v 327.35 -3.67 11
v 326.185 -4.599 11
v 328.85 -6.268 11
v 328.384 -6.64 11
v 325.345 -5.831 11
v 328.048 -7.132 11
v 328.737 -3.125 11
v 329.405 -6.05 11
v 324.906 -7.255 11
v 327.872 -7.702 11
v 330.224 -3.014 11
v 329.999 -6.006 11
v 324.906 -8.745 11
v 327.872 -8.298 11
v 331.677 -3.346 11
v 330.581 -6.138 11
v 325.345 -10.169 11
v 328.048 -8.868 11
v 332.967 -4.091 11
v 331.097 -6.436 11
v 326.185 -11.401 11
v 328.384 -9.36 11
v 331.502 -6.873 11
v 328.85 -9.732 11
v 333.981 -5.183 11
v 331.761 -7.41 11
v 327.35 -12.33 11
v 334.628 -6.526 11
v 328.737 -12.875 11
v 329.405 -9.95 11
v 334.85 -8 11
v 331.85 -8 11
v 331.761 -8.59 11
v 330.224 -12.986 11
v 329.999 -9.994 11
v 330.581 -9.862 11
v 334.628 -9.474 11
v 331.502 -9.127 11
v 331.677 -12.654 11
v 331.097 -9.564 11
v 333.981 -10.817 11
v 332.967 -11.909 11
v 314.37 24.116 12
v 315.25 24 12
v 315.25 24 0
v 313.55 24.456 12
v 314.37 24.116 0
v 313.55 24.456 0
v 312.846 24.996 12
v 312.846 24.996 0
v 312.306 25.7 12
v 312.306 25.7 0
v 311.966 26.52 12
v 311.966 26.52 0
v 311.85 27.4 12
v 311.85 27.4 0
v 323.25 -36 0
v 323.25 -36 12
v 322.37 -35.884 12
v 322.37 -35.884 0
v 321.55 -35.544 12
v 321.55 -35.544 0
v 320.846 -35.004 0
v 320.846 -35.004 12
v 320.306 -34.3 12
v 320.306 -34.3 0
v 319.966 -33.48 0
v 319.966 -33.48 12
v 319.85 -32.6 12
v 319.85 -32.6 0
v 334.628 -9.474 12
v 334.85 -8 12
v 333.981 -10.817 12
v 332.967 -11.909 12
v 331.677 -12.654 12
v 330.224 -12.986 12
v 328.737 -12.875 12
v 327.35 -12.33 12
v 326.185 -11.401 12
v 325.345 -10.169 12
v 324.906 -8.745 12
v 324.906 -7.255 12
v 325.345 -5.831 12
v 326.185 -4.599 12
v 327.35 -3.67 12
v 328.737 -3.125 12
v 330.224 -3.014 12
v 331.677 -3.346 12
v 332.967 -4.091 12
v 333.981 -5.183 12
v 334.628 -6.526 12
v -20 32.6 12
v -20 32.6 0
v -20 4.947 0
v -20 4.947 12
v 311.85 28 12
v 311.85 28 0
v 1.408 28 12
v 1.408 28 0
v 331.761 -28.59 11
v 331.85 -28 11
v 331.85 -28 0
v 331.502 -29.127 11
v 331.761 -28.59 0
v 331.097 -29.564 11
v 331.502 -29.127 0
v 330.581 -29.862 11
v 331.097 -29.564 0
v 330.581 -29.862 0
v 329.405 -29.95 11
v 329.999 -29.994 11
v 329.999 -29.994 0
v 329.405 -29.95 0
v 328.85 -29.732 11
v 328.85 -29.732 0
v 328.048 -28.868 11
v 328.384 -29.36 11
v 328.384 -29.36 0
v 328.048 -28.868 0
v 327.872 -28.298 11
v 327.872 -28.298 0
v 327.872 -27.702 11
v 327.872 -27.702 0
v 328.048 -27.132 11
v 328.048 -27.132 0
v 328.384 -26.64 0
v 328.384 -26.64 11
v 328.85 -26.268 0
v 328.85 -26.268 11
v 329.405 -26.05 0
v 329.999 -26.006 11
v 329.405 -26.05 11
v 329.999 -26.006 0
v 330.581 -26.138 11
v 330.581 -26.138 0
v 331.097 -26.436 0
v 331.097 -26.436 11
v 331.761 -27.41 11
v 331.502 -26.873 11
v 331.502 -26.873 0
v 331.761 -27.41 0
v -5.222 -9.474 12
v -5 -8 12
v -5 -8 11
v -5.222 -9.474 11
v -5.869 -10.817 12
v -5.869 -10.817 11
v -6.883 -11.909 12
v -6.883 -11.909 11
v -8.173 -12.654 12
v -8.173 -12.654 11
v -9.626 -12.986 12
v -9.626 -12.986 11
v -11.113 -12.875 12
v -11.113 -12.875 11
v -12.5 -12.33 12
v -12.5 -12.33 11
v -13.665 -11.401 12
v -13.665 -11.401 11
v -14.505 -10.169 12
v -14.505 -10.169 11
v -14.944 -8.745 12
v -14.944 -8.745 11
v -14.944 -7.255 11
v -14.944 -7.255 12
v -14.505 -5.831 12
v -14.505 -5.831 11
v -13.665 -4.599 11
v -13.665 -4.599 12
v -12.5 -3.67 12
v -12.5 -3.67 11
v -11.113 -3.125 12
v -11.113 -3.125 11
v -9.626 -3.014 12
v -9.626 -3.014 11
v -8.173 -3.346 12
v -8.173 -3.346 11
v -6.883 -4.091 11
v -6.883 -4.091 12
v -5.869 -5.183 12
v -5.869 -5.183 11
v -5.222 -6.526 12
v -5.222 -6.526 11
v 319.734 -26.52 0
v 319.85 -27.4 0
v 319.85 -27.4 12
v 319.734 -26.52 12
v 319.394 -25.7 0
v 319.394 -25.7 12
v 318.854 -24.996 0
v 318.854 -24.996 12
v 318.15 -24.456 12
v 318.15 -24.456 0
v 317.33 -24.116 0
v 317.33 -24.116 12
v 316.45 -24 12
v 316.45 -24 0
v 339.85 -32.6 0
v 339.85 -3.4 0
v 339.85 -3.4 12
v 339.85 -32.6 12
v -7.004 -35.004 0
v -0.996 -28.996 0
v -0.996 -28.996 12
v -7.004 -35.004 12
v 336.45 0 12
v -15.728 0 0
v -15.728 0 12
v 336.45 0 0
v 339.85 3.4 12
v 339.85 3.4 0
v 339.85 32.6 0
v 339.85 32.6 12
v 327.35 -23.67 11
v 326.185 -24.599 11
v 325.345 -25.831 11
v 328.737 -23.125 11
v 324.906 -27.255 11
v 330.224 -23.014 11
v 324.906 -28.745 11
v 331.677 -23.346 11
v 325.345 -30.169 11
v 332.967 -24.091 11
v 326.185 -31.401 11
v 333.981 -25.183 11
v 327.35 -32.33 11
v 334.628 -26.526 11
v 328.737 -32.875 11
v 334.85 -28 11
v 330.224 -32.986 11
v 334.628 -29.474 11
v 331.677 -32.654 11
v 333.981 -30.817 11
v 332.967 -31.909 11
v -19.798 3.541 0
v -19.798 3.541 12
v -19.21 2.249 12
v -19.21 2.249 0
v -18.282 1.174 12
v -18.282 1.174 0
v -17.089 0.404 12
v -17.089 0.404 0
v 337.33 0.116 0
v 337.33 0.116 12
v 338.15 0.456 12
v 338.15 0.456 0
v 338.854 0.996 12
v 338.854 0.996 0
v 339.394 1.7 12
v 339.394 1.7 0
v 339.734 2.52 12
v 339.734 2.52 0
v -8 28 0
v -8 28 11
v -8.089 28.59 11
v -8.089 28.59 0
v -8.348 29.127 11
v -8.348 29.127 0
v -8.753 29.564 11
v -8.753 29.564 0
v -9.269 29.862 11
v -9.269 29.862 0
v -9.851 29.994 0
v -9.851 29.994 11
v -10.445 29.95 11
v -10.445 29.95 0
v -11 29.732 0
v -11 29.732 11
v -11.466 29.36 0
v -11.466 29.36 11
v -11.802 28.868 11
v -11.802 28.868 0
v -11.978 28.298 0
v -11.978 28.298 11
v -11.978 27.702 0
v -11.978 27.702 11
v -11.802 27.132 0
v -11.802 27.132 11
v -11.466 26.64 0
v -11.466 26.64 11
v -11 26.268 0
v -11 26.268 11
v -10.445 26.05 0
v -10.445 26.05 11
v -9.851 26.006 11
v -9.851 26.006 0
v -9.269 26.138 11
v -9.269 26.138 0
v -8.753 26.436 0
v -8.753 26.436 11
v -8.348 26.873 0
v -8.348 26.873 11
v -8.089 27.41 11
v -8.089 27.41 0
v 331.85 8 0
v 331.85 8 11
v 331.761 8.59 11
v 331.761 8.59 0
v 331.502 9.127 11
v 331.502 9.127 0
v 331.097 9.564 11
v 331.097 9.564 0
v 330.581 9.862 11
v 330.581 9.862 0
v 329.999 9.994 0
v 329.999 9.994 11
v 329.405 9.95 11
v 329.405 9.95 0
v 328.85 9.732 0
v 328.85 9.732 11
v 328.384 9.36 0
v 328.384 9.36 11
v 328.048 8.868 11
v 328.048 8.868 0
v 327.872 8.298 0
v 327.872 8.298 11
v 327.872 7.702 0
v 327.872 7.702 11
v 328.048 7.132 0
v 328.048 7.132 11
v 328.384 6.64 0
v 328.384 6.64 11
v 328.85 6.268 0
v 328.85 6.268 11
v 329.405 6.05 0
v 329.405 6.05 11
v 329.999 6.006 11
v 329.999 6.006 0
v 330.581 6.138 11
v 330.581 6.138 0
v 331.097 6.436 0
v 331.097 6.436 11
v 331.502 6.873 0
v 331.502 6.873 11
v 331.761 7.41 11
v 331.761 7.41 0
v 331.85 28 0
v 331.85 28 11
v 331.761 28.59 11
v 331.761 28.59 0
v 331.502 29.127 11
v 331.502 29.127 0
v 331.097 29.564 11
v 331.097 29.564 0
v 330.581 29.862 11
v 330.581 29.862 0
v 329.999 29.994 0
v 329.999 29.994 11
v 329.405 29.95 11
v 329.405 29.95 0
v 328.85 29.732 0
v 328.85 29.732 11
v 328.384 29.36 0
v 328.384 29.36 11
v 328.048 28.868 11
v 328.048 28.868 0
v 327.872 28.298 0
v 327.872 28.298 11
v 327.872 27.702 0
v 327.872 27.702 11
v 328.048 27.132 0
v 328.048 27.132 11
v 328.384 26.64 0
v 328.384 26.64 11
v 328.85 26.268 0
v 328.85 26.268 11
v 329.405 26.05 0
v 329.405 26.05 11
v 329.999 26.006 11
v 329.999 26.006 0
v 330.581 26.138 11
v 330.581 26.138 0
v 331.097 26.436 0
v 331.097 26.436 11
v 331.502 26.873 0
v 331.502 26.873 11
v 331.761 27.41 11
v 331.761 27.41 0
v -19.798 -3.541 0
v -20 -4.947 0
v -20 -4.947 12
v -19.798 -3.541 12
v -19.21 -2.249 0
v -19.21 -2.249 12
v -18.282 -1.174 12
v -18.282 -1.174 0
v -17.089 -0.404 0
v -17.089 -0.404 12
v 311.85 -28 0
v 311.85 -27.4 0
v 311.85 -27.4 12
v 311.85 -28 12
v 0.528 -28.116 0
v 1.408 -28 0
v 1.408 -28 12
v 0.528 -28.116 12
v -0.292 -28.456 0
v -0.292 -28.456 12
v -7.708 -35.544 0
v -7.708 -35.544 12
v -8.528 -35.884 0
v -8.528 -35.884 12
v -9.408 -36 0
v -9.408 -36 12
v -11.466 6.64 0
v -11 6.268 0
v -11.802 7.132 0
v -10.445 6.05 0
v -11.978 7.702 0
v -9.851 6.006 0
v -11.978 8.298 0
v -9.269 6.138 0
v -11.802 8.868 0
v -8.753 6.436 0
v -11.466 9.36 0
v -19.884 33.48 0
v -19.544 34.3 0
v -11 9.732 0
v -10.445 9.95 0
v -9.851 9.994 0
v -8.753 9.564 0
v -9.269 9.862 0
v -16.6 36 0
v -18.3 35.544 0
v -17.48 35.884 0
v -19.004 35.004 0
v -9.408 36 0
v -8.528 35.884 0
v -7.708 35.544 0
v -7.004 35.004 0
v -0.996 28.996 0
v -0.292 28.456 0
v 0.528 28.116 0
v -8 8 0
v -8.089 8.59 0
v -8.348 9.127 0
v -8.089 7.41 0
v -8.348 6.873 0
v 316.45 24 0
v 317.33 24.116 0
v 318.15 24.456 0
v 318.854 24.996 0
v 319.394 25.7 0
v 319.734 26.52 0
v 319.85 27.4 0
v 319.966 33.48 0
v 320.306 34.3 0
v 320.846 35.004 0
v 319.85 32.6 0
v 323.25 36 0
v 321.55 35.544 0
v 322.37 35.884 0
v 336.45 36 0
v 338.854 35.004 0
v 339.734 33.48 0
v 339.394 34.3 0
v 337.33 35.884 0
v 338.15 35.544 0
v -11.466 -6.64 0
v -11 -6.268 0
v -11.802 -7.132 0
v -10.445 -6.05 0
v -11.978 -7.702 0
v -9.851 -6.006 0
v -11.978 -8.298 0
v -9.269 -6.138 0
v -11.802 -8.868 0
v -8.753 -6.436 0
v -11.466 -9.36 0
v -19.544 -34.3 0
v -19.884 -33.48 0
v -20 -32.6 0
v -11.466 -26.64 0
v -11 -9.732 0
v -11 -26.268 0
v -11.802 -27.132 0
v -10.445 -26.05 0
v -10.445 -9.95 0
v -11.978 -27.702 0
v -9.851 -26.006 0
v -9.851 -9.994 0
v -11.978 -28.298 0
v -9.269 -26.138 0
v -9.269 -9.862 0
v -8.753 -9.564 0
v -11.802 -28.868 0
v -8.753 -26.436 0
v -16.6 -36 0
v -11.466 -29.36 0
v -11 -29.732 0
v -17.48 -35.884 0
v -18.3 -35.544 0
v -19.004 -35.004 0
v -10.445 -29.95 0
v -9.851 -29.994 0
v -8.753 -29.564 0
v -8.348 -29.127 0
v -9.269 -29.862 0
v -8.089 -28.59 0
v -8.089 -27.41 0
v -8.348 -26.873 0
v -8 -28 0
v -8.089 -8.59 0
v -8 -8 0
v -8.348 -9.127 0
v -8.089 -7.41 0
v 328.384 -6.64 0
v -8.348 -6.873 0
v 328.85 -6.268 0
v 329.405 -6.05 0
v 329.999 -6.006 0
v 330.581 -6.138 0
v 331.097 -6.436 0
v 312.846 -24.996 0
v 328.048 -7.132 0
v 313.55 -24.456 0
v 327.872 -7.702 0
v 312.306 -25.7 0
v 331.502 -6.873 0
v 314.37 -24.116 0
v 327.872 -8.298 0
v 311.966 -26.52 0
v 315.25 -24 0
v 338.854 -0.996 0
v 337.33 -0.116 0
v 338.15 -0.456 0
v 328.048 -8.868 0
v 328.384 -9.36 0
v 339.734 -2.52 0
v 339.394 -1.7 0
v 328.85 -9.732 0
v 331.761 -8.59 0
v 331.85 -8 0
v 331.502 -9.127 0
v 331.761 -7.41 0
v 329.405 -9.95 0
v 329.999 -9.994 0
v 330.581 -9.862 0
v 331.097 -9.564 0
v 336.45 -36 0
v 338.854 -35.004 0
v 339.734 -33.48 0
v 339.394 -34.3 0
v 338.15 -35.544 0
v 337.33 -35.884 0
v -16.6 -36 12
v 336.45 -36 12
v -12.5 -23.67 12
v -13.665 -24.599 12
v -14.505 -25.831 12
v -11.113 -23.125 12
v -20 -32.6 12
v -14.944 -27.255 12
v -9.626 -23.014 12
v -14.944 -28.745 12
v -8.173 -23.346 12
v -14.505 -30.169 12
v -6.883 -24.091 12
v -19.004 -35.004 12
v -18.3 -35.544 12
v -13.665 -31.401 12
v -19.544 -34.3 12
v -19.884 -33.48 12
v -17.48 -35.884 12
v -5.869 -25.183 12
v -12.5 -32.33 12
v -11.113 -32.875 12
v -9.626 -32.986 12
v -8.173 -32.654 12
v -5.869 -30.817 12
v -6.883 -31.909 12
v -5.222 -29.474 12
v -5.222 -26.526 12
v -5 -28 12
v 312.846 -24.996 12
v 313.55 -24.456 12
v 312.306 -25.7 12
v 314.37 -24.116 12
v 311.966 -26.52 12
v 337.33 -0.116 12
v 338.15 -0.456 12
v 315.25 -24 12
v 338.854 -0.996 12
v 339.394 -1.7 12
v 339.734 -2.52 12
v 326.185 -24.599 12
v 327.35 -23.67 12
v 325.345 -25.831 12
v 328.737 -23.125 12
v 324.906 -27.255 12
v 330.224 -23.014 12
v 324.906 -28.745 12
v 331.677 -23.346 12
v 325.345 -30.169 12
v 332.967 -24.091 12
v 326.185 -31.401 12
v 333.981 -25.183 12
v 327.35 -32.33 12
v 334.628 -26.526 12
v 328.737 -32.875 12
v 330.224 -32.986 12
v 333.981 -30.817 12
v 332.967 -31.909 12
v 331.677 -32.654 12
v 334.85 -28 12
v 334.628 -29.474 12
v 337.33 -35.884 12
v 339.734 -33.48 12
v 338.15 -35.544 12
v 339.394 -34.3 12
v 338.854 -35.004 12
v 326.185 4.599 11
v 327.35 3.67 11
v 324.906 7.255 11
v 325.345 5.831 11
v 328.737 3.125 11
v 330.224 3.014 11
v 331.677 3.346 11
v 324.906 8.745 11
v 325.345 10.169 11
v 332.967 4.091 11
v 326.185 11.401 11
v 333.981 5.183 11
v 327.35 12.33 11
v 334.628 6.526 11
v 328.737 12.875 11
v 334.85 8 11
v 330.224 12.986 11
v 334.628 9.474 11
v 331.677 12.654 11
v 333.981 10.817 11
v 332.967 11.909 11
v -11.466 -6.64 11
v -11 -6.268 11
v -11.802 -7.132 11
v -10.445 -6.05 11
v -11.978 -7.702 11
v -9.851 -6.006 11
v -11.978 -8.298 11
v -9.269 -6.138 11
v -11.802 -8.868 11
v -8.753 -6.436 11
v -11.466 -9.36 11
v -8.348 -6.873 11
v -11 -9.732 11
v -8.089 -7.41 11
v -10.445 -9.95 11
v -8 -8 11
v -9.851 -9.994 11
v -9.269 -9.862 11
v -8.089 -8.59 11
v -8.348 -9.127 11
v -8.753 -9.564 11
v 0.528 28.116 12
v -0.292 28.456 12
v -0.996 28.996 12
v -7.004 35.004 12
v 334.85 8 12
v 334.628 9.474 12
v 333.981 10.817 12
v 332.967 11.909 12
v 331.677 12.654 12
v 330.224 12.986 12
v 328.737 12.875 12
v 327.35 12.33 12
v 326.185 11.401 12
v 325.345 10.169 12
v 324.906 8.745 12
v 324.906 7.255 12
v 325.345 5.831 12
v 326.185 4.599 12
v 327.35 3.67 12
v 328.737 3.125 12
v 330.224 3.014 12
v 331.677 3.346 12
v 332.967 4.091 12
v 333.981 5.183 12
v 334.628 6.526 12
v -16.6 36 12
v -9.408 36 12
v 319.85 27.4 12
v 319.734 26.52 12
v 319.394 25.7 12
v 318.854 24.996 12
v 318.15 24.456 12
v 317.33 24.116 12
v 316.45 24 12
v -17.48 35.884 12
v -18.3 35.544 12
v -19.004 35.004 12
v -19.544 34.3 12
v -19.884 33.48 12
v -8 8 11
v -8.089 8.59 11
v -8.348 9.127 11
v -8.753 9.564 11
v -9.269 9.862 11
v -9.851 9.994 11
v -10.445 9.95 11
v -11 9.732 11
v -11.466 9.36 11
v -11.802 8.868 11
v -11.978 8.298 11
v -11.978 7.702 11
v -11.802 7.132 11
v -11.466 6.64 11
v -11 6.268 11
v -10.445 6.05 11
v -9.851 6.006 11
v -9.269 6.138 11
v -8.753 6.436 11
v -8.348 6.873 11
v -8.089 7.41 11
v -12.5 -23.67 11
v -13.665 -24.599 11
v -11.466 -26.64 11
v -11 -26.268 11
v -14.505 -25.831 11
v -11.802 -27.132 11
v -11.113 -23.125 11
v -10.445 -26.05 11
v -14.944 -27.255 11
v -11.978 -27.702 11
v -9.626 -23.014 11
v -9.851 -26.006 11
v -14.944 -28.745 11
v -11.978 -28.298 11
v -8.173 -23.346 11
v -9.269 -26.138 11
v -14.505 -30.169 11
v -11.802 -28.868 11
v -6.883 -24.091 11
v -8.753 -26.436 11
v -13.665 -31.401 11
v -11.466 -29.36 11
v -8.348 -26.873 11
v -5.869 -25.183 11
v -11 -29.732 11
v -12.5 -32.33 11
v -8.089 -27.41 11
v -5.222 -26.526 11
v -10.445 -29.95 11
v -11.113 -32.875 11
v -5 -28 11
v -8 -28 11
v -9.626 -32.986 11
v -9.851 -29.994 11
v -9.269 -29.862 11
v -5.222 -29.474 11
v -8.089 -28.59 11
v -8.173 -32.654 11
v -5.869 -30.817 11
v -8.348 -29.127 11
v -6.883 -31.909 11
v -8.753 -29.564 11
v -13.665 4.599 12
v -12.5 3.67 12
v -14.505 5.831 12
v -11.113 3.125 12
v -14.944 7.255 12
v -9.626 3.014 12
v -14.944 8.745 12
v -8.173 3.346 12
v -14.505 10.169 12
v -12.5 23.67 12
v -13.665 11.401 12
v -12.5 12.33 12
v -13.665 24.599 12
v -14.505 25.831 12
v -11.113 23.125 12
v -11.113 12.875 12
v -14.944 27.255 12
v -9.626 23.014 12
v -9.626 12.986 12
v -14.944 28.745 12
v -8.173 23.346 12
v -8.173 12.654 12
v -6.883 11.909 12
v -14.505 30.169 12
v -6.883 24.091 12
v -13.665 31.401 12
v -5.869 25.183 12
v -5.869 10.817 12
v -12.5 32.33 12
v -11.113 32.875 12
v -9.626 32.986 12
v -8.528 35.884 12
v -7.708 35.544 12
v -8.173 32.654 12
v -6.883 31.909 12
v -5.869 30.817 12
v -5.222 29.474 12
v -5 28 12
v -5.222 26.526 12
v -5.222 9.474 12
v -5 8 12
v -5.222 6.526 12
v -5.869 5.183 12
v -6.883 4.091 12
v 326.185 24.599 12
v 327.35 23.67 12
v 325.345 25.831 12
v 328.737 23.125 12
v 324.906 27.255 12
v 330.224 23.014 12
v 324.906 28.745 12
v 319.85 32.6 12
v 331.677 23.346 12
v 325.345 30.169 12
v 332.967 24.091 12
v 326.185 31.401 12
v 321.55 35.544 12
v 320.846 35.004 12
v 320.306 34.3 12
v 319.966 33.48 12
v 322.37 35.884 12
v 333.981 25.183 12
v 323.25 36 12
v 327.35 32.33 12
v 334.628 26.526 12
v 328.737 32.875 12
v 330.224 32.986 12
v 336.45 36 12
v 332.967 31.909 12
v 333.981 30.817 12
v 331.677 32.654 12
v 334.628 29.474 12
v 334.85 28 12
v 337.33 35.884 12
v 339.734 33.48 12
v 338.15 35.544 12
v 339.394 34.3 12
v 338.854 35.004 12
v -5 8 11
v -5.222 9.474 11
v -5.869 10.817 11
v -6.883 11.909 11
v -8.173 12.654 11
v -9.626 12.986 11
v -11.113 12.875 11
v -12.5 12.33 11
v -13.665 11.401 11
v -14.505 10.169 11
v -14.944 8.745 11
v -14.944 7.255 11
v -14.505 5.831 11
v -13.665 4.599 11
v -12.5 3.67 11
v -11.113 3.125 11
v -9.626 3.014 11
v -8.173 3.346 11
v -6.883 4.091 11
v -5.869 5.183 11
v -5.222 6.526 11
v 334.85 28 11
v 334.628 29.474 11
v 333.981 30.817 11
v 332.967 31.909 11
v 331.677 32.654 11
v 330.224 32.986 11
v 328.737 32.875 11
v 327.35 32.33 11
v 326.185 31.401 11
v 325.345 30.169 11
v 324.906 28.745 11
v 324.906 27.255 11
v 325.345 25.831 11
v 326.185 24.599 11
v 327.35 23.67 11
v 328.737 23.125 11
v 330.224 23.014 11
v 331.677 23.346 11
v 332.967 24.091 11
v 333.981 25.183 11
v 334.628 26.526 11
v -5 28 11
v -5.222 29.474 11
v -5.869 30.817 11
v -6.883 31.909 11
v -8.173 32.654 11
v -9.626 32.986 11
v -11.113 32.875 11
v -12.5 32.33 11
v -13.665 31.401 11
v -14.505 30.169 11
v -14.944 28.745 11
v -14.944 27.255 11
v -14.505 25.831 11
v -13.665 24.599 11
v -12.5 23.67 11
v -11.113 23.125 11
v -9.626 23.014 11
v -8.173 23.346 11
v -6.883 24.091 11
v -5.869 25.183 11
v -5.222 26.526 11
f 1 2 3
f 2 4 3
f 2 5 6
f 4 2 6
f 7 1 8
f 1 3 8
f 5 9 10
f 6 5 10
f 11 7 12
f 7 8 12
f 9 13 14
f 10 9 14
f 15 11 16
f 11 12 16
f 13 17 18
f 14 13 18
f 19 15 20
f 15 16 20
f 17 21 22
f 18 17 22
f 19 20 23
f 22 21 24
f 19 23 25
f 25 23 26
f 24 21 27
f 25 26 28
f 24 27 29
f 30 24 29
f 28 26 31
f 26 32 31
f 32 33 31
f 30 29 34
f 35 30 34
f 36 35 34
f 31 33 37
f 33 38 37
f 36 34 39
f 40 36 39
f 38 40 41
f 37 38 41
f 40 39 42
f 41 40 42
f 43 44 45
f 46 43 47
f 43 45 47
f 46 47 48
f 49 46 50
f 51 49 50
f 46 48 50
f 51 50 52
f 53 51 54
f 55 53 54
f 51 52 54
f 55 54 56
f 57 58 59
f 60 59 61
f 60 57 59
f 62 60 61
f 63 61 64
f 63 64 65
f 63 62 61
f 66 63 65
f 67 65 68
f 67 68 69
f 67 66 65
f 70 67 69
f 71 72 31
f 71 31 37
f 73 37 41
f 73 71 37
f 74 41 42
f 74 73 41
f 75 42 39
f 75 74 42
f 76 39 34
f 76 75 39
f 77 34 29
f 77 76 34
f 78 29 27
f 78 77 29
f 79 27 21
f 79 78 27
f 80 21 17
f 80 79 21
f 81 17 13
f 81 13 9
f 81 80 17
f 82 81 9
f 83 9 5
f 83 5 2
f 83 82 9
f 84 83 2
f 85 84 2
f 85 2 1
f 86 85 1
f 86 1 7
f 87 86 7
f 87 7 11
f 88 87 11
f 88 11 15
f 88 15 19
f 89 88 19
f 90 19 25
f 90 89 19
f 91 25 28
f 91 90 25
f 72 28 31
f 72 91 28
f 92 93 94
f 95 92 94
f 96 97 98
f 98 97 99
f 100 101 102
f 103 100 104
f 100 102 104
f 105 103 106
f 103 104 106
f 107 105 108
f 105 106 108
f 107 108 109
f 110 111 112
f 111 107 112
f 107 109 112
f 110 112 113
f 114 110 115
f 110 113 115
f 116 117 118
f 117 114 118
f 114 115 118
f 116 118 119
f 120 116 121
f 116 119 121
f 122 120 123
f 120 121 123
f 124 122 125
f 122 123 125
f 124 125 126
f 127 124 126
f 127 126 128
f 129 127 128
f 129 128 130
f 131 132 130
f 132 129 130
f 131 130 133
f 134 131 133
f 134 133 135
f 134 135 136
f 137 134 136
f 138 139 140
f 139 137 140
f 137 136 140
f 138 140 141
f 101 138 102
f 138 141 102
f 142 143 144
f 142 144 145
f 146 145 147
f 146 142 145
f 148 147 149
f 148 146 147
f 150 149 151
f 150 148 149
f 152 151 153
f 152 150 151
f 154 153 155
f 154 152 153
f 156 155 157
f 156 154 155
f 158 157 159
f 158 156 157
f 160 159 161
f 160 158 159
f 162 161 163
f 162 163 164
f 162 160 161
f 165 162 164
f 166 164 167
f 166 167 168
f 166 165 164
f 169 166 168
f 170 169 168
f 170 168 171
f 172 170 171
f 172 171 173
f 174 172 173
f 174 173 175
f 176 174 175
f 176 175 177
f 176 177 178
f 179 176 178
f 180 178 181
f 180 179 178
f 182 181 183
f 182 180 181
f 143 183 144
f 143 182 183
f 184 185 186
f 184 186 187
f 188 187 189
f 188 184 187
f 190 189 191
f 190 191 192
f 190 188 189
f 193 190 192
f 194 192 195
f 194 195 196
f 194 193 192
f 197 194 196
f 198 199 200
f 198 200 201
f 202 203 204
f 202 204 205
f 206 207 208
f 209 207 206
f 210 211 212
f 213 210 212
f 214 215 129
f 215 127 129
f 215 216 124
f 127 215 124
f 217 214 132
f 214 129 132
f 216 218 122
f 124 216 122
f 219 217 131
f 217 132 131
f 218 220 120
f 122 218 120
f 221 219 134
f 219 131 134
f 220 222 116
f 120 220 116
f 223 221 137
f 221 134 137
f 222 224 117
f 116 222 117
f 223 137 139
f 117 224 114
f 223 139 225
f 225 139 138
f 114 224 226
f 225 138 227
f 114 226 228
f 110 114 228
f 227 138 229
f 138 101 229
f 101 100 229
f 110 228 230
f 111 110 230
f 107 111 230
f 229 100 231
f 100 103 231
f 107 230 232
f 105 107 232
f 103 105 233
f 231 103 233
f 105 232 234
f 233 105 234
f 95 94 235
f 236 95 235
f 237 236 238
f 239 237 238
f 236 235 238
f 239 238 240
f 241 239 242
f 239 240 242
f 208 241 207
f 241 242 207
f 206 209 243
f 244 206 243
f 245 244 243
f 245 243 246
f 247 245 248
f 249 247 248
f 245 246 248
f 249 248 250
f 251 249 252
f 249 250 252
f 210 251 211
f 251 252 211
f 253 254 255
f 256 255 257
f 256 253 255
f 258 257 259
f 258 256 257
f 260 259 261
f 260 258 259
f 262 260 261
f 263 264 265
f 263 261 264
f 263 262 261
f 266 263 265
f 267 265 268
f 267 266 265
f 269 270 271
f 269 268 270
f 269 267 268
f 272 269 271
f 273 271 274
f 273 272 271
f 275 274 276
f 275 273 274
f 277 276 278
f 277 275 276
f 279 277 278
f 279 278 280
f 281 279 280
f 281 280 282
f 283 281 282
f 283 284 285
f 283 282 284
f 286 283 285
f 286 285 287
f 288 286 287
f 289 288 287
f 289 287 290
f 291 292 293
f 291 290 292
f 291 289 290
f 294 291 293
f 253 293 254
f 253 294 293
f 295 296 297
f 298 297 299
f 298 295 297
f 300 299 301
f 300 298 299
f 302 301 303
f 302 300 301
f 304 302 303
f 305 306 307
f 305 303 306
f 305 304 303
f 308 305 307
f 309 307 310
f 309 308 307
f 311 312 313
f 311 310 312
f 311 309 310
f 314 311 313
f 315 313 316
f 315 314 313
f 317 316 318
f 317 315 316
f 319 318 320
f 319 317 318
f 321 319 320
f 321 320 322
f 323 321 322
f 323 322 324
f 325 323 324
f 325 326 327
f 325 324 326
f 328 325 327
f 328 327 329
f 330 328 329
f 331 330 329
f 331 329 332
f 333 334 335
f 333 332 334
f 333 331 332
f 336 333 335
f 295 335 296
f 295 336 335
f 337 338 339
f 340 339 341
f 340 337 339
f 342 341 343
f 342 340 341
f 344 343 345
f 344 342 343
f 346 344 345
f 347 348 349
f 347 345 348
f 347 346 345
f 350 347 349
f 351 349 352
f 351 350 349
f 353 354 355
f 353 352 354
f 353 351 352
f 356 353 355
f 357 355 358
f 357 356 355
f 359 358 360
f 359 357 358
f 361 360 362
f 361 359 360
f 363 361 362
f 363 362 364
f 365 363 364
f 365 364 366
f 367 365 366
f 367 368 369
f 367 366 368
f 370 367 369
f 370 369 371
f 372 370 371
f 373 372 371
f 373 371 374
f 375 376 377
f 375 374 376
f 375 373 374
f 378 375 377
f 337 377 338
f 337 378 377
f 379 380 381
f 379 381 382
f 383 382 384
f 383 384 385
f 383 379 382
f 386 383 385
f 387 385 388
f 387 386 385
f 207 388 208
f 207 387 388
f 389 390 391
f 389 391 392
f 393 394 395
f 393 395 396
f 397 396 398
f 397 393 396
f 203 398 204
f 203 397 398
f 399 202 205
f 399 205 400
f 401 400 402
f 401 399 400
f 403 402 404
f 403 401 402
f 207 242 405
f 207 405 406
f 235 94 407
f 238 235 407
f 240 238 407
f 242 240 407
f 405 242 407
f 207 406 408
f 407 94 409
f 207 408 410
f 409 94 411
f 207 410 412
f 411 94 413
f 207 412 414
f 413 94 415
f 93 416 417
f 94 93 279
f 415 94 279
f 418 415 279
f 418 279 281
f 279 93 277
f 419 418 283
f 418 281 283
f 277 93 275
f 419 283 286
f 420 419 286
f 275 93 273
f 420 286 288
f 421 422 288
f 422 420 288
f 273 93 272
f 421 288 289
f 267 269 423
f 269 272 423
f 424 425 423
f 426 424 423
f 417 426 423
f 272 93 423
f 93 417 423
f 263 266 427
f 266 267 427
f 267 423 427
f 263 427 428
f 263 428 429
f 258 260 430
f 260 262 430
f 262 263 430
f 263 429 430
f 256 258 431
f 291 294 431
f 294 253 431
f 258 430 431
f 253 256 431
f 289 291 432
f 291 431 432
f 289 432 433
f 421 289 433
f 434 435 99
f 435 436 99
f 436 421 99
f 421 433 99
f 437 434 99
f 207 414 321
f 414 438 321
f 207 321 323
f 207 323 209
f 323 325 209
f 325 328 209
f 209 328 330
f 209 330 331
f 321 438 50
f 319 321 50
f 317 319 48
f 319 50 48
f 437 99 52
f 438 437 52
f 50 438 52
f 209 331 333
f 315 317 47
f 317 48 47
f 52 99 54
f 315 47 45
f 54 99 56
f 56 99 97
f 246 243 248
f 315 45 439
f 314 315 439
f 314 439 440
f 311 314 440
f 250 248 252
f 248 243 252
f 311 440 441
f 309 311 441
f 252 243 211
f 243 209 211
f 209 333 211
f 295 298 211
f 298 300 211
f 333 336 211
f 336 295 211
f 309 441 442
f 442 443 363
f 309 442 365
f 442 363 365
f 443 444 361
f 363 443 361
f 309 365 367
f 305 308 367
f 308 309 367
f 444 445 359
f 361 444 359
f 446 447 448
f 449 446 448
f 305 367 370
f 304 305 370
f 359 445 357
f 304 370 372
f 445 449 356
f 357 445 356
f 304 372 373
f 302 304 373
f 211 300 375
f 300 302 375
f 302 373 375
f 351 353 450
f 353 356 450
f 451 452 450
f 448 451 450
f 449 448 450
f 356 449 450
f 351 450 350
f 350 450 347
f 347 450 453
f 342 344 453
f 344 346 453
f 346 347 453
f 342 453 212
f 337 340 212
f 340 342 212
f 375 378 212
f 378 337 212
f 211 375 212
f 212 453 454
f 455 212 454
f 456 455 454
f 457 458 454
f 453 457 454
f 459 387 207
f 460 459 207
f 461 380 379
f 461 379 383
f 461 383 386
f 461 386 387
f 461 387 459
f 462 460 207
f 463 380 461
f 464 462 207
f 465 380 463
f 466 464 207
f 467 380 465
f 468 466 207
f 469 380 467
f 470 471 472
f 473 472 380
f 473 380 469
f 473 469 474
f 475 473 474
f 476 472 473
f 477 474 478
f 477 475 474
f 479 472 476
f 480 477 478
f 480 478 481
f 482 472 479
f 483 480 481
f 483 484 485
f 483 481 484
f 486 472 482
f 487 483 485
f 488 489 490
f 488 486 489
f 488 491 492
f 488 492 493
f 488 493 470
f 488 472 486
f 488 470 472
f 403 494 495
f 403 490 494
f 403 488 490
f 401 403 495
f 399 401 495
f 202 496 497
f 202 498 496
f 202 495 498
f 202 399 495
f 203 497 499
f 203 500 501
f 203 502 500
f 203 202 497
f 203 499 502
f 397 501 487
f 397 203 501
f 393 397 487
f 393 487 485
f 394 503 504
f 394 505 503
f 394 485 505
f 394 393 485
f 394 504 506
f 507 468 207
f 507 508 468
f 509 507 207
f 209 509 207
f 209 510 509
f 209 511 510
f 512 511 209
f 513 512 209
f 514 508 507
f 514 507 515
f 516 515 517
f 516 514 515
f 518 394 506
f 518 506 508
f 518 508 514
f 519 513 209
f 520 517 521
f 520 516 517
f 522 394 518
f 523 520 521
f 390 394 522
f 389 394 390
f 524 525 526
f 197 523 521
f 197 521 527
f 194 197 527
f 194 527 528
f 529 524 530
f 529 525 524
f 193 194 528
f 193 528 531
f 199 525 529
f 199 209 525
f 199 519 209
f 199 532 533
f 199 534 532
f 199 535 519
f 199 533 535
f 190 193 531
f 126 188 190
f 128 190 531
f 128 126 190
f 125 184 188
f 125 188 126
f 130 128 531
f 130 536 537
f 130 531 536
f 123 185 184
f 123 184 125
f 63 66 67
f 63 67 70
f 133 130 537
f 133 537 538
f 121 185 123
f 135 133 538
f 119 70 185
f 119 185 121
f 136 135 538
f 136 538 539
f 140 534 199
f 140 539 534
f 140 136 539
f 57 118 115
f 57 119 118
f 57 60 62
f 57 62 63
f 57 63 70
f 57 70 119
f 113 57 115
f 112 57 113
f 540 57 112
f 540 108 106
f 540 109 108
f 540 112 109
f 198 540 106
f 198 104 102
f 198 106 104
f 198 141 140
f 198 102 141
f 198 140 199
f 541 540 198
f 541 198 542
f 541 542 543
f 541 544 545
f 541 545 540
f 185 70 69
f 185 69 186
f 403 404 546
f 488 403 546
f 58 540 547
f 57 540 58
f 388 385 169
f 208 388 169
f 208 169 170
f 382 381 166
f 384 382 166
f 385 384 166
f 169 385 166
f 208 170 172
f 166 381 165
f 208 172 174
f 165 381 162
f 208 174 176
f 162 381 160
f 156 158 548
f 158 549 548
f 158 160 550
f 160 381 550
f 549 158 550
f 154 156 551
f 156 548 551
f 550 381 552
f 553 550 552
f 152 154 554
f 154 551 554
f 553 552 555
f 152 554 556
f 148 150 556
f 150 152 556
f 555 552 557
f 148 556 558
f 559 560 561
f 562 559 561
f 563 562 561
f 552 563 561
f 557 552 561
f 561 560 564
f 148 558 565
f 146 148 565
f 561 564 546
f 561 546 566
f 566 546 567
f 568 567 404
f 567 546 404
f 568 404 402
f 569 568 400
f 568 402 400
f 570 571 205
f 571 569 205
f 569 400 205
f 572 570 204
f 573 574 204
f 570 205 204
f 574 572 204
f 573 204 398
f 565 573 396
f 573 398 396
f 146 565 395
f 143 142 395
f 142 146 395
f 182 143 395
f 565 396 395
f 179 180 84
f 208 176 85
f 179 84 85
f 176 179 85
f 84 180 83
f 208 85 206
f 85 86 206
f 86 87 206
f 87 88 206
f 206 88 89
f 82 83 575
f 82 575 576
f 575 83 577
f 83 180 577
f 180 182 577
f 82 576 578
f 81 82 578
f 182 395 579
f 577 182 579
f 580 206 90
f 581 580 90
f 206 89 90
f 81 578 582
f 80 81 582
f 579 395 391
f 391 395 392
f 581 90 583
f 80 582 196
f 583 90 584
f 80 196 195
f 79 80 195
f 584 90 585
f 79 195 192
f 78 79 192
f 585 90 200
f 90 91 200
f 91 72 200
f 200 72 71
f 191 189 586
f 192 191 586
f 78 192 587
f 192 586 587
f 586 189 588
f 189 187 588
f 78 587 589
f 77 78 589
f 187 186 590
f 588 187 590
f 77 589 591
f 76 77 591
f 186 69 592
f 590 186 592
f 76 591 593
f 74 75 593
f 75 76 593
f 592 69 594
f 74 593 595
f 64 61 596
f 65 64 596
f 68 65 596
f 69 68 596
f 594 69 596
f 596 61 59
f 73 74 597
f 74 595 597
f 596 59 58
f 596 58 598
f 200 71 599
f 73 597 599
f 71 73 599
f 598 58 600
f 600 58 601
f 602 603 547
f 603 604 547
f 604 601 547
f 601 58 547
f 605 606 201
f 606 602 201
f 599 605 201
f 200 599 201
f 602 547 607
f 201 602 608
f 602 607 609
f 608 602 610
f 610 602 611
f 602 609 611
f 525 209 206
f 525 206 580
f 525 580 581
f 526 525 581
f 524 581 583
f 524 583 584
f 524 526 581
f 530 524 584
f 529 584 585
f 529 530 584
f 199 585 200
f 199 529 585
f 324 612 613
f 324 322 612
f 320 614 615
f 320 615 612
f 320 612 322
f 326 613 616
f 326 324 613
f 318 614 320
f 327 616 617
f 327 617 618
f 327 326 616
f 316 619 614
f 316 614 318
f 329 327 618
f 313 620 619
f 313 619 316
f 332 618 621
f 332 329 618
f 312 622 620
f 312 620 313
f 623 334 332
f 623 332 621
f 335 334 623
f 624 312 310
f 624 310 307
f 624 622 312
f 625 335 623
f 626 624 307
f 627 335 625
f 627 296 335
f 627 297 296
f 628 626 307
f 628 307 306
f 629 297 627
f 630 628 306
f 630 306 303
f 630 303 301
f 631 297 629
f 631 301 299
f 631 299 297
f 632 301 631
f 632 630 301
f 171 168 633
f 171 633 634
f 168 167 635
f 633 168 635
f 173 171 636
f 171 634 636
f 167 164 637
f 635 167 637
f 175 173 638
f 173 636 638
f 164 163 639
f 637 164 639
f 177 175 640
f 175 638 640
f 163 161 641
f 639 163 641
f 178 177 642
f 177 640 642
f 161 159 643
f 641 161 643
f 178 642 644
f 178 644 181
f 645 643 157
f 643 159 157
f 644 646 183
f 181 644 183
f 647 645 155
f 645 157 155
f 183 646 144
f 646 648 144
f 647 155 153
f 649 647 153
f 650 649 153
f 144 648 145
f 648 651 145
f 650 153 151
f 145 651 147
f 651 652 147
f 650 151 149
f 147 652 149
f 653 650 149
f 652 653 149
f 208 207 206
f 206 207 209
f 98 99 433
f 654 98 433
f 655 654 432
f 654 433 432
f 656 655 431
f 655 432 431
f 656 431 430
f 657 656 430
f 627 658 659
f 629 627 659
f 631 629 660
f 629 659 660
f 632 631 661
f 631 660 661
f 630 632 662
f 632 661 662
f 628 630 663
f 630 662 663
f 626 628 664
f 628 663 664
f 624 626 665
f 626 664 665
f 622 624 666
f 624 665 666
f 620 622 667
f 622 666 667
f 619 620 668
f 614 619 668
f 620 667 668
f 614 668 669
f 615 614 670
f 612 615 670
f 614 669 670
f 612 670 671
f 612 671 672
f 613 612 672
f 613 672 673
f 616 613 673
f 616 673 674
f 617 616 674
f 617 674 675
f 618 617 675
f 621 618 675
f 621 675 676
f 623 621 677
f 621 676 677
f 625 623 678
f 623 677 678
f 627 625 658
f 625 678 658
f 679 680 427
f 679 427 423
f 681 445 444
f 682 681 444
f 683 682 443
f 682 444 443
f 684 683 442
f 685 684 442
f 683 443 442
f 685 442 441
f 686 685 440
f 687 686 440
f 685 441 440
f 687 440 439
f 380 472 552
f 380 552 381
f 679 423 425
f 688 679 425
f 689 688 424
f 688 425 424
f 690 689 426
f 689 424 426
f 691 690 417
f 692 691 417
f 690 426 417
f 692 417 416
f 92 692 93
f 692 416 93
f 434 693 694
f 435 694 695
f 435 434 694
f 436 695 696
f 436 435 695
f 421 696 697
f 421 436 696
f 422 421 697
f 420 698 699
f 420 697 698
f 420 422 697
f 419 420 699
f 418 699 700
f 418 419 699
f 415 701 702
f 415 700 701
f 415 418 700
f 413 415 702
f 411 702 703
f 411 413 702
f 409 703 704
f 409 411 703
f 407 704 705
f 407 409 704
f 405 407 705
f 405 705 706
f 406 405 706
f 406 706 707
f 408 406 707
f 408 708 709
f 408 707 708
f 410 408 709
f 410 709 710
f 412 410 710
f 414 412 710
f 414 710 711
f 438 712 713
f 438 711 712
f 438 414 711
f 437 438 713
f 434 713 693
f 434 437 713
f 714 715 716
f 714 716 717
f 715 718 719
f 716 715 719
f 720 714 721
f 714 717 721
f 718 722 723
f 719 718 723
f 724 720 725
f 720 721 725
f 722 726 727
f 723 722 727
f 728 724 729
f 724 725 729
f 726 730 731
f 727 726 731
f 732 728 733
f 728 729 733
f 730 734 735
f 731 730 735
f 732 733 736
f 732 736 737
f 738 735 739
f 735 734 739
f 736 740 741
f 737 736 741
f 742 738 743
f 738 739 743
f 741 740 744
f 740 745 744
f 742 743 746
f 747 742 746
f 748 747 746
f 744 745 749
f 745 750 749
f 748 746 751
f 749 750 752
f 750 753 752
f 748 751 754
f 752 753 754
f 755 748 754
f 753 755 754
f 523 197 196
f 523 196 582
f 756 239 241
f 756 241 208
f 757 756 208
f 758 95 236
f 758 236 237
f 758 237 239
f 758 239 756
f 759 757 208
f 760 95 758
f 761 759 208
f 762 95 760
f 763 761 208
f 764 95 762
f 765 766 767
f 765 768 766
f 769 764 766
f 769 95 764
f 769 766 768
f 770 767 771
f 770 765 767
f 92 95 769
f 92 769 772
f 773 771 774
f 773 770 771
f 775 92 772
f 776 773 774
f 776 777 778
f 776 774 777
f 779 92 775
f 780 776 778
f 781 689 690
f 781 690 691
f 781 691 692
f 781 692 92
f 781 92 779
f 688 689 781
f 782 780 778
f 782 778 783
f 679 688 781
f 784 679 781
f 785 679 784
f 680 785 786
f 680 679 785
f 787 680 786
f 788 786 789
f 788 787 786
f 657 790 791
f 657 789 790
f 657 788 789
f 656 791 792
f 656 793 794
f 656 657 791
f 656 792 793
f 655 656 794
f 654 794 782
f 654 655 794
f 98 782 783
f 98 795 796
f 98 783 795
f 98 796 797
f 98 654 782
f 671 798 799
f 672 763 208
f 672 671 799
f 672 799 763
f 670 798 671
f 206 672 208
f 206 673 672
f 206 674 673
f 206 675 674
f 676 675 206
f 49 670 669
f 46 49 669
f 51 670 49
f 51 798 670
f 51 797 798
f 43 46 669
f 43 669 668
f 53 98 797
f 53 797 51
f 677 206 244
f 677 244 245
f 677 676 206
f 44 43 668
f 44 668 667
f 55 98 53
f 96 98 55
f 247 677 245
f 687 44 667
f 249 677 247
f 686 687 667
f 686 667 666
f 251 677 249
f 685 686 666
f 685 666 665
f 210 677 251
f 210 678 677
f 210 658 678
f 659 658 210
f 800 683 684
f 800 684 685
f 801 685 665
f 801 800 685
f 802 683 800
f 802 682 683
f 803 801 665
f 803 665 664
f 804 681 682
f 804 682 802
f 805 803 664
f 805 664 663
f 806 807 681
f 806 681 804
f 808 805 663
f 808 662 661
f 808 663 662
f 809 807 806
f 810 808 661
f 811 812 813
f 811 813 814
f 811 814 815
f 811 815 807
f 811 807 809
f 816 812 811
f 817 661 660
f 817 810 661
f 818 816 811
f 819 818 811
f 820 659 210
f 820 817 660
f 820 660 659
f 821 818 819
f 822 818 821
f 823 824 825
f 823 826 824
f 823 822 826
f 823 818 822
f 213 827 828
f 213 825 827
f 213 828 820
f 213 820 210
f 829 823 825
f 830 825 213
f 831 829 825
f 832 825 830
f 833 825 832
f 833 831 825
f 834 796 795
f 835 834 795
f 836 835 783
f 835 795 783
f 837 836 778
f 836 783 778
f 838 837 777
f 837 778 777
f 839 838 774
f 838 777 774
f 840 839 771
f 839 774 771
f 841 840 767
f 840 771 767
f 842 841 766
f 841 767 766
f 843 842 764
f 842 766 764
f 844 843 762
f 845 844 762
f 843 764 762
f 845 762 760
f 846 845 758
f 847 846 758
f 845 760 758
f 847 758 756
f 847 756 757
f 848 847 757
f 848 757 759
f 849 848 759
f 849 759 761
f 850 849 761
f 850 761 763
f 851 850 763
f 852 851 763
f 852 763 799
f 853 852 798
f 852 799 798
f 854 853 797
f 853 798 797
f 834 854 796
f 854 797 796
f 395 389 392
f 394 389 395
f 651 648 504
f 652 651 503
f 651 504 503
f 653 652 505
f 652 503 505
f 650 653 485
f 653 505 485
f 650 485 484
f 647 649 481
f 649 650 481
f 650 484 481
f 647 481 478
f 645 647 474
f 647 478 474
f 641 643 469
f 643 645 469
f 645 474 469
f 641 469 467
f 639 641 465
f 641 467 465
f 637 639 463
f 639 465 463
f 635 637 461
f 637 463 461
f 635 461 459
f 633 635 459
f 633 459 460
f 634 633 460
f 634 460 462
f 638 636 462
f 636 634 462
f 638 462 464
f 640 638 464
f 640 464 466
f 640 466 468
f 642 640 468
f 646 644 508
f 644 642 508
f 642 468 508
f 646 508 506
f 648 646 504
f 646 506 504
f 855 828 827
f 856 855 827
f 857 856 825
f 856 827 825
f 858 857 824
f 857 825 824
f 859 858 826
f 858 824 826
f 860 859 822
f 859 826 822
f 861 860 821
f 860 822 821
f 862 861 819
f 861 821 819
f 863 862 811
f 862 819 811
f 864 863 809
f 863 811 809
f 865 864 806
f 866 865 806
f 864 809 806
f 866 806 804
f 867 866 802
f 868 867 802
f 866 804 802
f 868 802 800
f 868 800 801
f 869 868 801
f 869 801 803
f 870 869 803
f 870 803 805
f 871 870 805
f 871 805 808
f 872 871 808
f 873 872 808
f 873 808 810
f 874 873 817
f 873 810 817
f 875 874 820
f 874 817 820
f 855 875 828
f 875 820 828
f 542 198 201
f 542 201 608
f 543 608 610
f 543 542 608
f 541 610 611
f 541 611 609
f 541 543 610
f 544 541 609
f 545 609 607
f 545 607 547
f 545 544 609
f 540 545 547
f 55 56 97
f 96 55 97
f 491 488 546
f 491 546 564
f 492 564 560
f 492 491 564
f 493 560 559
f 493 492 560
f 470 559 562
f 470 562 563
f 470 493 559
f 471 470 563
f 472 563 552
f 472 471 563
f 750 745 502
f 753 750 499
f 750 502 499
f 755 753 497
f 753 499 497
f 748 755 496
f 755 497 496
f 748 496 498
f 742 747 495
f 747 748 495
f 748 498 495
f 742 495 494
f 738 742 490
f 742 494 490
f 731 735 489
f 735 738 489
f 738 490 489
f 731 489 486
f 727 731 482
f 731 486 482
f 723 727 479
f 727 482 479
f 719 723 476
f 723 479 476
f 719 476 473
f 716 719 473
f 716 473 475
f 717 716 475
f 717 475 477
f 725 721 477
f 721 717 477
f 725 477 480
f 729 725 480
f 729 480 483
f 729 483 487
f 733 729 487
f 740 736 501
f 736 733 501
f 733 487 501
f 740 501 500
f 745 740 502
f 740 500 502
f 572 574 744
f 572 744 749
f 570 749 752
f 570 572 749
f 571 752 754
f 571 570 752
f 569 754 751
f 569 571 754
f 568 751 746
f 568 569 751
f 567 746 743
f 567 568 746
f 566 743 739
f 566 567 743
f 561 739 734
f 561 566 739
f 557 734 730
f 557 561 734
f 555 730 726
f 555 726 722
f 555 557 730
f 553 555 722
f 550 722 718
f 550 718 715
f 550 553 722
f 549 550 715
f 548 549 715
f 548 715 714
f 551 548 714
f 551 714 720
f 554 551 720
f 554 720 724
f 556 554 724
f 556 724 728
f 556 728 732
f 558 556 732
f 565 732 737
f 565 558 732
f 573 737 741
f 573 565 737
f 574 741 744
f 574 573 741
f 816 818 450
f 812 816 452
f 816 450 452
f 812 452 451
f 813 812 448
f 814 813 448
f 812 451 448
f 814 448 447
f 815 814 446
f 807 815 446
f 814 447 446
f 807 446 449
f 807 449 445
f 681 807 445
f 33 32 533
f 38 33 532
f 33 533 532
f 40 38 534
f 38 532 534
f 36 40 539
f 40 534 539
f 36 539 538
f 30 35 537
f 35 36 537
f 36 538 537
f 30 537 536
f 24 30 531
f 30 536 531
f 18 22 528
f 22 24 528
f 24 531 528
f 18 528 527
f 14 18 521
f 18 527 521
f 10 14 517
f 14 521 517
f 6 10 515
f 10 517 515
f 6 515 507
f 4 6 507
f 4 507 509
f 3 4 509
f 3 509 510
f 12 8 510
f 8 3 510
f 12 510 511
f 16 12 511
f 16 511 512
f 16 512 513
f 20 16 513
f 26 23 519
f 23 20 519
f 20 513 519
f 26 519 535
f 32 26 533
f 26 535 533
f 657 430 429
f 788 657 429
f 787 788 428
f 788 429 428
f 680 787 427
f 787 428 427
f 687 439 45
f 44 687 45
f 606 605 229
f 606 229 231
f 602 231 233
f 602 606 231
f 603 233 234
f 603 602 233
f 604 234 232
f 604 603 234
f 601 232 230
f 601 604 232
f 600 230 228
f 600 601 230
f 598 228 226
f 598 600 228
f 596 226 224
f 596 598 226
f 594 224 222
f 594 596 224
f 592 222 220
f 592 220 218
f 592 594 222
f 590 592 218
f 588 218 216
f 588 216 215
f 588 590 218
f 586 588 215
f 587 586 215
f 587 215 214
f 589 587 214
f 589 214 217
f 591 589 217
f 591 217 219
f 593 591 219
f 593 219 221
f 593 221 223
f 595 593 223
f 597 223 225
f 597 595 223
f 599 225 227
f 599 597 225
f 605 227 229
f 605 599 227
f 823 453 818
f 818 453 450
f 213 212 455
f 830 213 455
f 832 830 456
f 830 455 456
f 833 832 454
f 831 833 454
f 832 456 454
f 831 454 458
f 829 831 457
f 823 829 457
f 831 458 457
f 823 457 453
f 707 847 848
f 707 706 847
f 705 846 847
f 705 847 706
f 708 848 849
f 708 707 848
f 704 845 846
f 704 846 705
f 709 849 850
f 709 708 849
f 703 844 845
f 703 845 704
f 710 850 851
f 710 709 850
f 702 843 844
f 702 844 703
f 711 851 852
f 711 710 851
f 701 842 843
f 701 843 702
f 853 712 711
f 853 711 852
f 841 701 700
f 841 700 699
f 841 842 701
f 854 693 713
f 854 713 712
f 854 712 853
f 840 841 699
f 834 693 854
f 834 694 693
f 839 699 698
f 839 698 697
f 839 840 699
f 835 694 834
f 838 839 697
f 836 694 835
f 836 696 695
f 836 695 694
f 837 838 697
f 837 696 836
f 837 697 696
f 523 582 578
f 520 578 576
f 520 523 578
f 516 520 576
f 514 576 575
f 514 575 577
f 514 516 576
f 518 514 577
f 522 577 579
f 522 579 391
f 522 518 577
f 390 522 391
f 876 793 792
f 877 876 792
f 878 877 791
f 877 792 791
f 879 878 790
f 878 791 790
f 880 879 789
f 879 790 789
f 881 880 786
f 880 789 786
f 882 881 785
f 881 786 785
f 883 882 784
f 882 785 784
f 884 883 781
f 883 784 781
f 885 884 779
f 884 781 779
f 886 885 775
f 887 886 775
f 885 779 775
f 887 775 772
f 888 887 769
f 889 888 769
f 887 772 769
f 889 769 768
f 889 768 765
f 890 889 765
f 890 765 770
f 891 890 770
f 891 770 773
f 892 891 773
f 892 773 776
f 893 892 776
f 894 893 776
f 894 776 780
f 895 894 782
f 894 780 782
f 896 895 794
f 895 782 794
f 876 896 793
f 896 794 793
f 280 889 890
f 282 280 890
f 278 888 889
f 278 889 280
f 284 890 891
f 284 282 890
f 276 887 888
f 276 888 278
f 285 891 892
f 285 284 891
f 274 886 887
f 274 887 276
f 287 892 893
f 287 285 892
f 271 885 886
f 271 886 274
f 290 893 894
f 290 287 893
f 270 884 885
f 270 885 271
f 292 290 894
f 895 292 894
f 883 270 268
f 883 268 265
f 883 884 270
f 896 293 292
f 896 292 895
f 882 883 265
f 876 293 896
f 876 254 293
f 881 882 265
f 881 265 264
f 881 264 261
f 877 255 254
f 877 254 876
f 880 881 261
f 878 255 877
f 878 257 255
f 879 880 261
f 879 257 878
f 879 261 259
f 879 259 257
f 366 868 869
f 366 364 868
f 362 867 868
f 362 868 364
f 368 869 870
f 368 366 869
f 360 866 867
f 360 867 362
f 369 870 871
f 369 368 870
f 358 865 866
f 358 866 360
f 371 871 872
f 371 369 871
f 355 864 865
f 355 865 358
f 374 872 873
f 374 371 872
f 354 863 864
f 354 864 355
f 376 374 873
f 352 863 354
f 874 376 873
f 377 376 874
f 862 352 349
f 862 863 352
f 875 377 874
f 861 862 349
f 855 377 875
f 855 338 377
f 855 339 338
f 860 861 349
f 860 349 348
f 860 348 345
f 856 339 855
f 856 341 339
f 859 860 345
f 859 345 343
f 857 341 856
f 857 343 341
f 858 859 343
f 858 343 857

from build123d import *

# Parameters (mm, degrees)
F0_R     = 5
F0_R_2   = 2
F1_DEPTH = 12
F2_R     = 5
F3_DEPTH = 1


with BuildPart() as f1:
    # F0 (on Top) → F1 (new body)
    with BuildSketch(Plane.XY):
        with BuildLine():
            Line((311.85, 28), (1.408326, 28))
            ThreePointArc((1.408326, 28), (0.107202, 28.25881), (-0.995837, 28.995837))
            Line((-0.995837, 28.995837), (-7.004163, 35.004163))
            ThreePointArc((-7.004163, 35.004163), (-8.107202, 35.74119), (-9.408326, 36))
            Line((-9.408326, 36), (-16.6, 36))
            ThreePointArc((-16.6, 36), (-19.004163, 35.004163), (-20, 32.6))
            Line((-20, 32.6), (-20, 4.946767))
            ThreePointArc((-20, 4.946767), (-18.784066, 1.678611), (-15.727663, 0))
            Line((-15.727663, 0), (0, 0))
            Line((0, 0), (329.85, 0))
            Line((329.85, 0), (336.45, 0))
            ThreePointArc((336.45, 0), (338.854163, 0.995837), (339.85, 3.4))
            Line((339.85, 3.4), (339.85, 32.6))
            ThreePointArc((339.85, 32.6), (338.854163, 35.004163), (336.45, 36))
            Line((336.45, 36), (323.25, 36))
            ThreePointArc((323.25, 36), (320.845837, 35.004163), (319.85, 32.6))
            Line((319.85, 32.6), (319.85, 28))
            Line((319.85, 28), (319.85, 27.4))
            ThreePointArc((319.85, 27.4), (318.854163, 24.995837), (316.45, 24))
            Line((316.45, 24), (315.25, 24))
            ThreePointArc((315.25, 24), (312.845837, 24.995837), (311.85, 27.4))
            Line((311.85, 27.4), (311.85, 28))
        make_face()
        with Locations((-10, 8)):
            Circle(F0_R, mode=Mode.SUBTRACT)
        with Locations((329.85, 8)):
            Circle(F0_R, mode=Mode.SUBTRACT)
        with Locations((-10, 28)):
            Circle(F0_R, mode=Mode.SUBTRACT)
        with Locations((329.85, 28)):
            Circle(F0_R, mode=Mode.SUBTRACT)
        with Locations((-10, 28)):
            Circle(F0_R)
        with Locations((-10, 28)):
            Circle(F0_R_2, mode=Mode.SUBTRACT)
        with Locations((-10, 8)):
            Circle(F0_R)
        with Locations((-10, 8)):
            Circle(F0_R_2, mode=Mode.SUBTRACT)
        with Locations((329.85, 8)):
            Circle(F0_R)
        with Locations((329.85, 8)):
            Circle(F0_R_2, mode=Mode.SUBTRACT)
        with Locations((329.85, 28)):
            Circle(F0_R)
        with Locations((329.85, 28)):
            Circle(F0_R_2, mode=Mode.SUBTRACT)
    extrude(amount=F1_DEPTH)

    # F2 (on face) → F3 (cut)
    with BuildSketch(Plane.XY.offset(12)):
        with Locations((329.85, 28)):
            Circle(F2_R)
        with Locations((329.85, 8)):
            Circle(F2_R)
        with Locations((-10, 8)):
            Circle(F2_R)
        with Locations((-10, 28)):
            Circle(F2_R)
    extrude(amount=-F3_DEPTH, mode=Mode.SUBTRACT)


with BuildPart() as f5_1:
    # F5: instance of F1
    add(f1.part.mirror(Plane.XZ))


solid = Compound([f1.part, f5_1.part])
